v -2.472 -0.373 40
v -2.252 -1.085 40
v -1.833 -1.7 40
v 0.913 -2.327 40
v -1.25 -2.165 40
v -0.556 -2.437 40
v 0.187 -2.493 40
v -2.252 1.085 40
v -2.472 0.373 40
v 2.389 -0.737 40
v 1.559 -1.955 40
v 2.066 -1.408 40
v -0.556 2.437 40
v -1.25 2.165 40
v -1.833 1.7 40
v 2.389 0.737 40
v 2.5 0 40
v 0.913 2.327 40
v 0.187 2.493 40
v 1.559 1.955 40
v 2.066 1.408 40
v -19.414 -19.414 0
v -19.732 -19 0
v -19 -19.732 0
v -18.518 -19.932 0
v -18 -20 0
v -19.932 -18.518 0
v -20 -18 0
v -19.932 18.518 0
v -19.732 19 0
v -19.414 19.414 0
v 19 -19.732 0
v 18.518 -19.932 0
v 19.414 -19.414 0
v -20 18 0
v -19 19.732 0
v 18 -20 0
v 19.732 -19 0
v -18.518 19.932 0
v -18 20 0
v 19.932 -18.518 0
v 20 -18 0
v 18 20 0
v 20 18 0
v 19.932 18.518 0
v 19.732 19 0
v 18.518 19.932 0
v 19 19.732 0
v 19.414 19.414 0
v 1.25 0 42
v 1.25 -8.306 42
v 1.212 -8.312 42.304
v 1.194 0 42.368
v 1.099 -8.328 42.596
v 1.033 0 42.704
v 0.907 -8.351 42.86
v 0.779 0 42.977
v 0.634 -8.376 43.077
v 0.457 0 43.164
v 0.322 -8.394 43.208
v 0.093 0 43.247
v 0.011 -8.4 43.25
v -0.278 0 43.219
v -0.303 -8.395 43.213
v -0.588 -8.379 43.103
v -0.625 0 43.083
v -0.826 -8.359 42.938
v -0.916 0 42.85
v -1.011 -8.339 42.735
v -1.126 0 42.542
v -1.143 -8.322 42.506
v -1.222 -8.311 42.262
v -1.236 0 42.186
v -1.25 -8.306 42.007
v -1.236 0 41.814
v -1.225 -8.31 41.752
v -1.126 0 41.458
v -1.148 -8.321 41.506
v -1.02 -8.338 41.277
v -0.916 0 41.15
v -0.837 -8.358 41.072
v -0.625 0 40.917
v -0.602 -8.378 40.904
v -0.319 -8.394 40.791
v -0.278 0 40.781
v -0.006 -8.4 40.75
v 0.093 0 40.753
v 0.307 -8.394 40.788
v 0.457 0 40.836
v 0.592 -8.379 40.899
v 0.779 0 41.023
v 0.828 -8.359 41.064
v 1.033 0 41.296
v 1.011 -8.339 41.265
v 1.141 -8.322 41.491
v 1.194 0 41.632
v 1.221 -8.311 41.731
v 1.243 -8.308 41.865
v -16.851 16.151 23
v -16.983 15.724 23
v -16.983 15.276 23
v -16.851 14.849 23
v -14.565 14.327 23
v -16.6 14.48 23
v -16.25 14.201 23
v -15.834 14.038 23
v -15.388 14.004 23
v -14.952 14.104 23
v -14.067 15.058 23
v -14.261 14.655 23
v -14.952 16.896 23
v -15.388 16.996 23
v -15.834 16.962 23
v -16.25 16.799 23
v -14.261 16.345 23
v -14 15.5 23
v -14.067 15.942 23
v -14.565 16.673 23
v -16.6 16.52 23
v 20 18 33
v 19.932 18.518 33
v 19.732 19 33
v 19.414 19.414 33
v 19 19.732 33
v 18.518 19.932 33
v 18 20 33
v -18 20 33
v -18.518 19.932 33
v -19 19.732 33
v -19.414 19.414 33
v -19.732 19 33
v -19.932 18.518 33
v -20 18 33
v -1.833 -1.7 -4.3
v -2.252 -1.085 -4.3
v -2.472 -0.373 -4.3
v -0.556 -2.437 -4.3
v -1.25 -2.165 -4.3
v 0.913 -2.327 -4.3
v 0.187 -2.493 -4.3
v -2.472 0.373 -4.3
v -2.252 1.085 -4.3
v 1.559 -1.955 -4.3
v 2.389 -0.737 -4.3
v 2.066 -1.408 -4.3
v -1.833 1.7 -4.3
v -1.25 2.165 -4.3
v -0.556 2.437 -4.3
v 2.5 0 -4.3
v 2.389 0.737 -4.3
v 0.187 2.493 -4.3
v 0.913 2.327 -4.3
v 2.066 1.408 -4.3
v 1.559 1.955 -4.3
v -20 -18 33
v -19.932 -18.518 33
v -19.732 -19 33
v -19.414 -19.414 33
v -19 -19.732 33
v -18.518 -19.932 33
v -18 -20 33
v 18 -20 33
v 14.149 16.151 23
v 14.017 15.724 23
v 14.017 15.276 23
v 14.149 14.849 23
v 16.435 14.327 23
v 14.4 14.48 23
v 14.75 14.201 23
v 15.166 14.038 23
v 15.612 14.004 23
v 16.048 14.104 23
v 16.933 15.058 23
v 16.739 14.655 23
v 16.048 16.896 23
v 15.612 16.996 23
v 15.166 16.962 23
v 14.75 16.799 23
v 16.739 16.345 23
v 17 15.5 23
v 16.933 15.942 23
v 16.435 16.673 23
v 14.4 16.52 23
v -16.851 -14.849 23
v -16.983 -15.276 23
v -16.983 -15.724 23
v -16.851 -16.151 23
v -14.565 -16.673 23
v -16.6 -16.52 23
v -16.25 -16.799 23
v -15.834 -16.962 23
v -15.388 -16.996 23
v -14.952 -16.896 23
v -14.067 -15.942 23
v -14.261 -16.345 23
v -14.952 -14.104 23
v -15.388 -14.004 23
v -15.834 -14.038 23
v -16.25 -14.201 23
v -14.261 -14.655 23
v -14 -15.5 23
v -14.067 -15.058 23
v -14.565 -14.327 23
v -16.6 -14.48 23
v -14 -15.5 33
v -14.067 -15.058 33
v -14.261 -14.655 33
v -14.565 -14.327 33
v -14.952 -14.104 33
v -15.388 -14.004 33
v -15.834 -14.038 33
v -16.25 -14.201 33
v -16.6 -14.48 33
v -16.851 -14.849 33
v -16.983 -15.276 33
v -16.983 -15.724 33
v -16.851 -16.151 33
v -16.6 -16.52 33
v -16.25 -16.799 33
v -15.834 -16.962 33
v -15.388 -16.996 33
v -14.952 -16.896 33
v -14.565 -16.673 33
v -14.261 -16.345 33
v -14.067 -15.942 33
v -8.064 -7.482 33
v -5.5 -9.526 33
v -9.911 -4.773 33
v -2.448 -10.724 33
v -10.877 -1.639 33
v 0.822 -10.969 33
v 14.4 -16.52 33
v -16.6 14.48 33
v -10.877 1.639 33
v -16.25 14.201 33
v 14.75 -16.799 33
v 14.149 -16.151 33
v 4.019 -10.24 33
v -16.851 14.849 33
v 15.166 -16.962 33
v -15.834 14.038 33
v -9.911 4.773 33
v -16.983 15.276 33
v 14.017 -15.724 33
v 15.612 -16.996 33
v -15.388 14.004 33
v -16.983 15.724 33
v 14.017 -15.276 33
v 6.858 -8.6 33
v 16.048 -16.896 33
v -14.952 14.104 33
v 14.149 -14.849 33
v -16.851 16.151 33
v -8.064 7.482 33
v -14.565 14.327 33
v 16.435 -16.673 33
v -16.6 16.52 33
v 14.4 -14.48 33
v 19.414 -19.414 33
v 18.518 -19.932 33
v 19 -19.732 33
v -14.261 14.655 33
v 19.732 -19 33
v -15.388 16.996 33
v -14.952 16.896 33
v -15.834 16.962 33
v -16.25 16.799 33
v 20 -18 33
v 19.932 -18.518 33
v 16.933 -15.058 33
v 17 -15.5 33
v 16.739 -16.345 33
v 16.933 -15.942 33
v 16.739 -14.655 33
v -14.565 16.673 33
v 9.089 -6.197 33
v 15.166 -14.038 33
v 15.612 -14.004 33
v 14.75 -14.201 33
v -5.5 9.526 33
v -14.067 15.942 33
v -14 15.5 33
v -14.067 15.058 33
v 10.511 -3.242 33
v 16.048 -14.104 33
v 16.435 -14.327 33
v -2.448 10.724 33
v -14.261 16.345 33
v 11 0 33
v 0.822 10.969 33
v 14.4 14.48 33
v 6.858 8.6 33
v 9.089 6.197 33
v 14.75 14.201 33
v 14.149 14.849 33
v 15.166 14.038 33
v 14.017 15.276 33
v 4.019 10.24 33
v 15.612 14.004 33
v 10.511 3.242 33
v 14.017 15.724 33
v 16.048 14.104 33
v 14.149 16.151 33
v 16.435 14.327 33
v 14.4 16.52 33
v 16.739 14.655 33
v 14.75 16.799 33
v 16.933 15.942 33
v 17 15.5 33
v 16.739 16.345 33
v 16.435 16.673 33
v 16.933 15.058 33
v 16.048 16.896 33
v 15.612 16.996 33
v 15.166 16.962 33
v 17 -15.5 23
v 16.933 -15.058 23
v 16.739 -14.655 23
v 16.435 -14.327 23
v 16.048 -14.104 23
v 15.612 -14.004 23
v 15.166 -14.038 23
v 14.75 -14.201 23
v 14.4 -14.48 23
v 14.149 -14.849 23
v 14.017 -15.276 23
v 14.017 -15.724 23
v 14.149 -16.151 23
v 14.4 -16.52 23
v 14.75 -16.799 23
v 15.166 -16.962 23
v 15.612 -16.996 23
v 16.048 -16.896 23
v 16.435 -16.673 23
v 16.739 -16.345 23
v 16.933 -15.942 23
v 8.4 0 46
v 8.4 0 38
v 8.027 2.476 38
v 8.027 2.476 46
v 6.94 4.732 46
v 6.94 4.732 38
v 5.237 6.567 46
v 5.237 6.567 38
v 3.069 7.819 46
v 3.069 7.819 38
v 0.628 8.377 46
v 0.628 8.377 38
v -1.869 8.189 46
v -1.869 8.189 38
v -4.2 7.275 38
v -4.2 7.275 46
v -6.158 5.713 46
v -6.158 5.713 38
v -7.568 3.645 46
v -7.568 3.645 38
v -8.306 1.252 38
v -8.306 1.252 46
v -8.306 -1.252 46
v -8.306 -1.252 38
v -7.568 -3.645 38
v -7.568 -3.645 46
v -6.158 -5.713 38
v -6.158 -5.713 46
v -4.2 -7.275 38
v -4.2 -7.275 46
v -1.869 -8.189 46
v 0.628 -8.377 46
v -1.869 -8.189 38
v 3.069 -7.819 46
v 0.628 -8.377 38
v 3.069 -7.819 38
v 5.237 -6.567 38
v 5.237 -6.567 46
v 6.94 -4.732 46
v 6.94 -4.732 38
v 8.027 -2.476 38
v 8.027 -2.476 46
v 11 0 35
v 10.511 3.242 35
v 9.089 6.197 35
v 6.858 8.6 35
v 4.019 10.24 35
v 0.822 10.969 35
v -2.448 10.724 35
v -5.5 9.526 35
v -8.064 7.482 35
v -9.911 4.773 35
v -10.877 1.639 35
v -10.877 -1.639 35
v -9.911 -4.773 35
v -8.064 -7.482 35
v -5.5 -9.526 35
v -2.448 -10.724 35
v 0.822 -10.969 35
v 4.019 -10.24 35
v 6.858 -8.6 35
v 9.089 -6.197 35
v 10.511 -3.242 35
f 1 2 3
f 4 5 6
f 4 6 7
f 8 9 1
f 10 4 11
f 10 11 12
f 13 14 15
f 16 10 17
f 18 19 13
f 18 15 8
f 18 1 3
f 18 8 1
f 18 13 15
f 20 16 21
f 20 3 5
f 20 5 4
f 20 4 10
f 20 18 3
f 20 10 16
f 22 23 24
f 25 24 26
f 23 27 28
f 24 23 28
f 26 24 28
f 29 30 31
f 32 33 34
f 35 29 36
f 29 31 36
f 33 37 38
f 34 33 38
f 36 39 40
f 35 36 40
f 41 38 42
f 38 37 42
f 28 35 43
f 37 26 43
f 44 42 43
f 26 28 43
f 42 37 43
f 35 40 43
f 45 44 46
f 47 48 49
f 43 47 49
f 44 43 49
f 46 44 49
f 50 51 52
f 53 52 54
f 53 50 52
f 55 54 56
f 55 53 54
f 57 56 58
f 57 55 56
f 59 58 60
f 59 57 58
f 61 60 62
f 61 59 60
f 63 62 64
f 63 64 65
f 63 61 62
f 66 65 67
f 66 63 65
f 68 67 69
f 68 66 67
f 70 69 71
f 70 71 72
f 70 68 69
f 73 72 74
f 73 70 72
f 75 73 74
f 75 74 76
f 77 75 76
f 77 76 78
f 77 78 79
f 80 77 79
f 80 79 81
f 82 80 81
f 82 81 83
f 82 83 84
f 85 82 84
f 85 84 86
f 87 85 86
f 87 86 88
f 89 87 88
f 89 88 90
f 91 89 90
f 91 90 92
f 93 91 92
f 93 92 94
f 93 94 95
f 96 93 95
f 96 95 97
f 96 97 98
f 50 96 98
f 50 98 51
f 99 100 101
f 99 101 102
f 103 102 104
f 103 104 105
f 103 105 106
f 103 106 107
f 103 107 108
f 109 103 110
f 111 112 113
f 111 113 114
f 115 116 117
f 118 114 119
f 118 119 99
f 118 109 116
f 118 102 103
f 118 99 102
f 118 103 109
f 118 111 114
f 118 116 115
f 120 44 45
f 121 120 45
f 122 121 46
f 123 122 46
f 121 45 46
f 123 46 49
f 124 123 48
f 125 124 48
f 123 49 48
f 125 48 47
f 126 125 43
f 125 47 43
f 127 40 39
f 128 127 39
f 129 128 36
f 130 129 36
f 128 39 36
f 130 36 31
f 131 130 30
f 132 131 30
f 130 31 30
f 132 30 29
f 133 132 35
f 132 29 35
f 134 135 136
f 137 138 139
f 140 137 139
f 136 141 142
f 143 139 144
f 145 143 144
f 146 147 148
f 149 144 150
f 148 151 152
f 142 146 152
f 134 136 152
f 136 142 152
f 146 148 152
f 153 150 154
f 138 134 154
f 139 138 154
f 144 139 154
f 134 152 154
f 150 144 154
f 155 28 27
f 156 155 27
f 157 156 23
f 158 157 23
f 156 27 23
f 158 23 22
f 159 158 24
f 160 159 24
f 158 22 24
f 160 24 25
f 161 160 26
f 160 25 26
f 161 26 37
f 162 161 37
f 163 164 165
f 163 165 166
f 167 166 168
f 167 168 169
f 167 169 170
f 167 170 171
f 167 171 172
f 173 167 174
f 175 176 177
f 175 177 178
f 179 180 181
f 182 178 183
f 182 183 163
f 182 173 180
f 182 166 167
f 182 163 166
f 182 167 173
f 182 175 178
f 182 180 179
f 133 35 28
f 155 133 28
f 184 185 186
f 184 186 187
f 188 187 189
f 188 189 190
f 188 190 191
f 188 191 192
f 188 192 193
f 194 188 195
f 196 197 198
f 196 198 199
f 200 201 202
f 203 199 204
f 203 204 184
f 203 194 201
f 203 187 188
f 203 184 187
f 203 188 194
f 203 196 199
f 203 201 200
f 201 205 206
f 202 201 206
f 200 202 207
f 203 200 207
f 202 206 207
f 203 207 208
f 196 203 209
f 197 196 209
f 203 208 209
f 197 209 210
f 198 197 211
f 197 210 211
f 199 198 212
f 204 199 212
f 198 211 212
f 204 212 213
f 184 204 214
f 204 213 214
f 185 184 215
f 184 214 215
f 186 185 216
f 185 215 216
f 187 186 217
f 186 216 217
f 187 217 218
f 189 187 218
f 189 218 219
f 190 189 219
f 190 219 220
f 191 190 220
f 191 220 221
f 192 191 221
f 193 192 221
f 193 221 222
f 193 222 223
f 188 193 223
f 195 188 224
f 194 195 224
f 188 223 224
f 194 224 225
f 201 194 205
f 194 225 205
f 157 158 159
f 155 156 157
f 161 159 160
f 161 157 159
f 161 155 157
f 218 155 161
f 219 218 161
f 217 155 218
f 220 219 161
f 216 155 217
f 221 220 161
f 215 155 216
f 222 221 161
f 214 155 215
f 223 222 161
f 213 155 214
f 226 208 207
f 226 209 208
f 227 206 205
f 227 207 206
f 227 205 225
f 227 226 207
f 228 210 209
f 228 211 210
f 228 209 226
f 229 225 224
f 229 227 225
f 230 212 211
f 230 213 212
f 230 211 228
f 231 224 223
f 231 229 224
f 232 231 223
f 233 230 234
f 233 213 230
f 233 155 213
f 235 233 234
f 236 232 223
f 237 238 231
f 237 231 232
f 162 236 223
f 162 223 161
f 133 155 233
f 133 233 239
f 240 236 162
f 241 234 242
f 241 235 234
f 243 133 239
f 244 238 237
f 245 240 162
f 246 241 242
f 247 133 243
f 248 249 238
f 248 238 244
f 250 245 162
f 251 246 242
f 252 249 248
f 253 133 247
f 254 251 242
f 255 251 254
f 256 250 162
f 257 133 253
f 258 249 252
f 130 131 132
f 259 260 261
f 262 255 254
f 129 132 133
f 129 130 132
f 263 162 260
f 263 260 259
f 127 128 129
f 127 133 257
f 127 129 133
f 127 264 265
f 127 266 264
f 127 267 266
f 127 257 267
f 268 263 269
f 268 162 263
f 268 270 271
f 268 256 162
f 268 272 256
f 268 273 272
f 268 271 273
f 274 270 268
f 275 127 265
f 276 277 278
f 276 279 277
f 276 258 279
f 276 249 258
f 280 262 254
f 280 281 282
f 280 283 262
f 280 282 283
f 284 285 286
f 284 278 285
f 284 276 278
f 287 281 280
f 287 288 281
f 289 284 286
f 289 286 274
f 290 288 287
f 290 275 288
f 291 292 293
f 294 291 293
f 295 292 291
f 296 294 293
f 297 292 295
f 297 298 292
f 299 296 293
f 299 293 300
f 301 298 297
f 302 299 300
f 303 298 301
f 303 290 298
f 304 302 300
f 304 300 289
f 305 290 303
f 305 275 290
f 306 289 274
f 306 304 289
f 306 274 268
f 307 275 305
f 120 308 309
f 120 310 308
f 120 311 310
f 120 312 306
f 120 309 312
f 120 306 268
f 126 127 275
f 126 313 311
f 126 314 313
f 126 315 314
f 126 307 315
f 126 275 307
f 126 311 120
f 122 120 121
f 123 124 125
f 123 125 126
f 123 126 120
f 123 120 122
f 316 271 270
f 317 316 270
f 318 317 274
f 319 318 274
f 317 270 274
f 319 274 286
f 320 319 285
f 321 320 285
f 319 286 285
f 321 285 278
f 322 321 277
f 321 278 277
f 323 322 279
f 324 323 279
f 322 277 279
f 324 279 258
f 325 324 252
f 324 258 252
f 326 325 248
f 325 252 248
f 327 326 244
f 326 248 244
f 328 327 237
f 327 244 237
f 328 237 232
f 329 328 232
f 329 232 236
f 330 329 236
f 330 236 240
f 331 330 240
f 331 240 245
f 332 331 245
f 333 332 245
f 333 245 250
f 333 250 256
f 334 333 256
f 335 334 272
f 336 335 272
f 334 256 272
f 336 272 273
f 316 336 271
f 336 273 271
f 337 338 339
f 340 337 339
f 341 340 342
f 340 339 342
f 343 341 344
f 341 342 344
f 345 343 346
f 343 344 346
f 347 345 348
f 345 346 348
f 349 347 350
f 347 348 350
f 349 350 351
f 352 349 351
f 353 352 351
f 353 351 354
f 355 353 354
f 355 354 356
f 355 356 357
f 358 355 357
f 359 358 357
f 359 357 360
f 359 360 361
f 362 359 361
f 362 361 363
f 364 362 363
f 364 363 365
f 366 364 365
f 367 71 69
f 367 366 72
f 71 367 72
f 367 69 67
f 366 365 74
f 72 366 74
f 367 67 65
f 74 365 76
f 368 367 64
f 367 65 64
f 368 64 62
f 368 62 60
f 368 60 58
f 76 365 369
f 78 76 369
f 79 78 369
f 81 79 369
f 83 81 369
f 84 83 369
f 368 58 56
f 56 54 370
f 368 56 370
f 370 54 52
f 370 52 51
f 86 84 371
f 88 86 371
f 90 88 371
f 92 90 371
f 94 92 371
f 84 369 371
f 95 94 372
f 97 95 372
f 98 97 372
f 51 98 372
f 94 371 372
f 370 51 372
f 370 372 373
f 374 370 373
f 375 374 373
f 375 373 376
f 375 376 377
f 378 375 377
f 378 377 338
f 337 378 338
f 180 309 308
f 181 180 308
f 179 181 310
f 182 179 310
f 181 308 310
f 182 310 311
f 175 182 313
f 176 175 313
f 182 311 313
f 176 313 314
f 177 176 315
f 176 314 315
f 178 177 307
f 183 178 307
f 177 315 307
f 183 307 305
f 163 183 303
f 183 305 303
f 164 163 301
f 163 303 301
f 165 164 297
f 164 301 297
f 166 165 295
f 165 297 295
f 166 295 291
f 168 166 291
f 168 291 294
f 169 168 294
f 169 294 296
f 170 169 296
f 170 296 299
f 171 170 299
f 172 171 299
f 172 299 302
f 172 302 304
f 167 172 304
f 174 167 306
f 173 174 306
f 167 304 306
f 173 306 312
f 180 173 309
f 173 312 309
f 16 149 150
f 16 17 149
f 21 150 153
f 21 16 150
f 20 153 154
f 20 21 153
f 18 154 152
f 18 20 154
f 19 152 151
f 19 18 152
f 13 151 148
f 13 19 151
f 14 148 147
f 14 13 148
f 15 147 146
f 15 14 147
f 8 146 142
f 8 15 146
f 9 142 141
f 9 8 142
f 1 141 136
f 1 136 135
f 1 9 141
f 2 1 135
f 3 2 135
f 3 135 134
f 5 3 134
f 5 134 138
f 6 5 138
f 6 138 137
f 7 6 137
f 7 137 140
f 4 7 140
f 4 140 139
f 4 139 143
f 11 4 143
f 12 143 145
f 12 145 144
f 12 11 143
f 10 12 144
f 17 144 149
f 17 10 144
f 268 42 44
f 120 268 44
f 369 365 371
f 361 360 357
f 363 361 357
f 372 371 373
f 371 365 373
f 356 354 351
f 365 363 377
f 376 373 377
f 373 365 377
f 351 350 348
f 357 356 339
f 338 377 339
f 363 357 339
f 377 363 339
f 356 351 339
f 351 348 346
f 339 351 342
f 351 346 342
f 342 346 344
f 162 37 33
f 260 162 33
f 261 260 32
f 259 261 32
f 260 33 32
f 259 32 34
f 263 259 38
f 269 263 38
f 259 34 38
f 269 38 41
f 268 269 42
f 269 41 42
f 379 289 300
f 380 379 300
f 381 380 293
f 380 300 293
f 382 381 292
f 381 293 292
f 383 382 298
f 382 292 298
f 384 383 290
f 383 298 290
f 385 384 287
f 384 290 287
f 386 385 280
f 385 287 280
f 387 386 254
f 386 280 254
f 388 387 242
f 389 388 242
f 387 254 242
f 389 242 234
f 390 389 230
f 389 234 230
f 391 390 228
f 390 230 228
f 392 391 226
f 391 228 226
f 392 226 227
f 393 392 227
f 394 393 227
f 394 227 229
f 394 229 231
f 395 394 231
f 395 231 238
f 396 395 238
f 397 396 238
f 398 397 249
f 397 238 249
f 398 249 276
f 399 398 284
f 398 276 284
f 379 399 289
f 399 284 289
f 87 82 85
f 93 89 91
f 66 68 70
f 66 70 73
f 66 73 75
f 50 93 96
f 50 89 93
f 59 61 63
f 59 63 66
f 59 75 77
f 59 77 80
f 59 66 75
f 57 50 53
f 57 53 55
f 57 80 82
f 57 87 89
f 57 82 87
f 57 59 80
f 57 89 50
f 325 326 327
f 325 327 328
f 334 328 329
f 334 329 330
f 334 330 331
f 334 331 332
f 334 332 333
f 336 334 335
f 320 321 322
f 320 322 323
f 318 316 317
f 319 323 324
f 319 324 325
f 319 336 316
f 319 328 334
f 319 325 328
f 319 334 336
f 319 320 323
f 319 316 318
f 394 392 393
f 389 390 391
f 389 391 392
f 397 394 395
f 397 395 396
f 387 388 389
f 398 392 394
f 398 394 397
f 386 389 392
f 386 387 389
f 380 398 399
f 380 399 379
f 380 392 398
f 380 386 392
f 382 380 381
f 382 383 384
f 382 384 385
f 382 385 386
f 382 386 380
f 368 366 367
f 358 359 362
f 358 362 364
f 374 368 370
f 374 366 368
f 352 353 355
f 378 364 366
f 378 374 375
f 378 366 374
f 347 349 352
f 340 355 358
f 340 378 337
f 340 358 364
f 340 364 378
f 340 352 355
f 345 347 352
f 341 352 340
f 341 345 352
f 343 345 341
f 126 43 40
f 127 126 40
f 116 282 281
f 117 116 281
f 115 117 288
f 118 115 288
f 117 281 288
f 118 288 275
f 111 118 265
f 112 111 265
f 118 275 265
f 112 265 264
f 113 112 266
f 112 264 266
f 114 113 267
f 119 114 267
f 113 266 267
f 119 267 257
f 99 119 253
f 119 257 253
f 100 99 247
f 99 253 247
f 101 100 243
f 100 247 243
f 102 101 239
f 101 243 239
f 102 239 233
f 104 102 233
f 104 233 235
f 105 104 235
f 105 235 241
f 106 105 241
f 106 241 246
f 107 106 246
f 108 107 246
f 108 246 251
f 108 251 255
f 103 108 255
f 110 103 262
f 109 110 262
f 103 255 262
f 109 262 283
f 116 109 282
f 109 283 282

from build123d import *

# Parameters (mm, degrees)
F1_DEPTH      = 33
F2_R          = 11
F3_DEPTH      = 2
F5_START      = 5
F4_R          = 8.4
F5_DEPTH      = 8
F6_R          = 2.5
F7_DEPTH      = 40
F7_DEPTH_BACK = 4.3
F8_R          = 1.5
F9_DEPTH      = 10
F10_R         = 1.25
F11_DEPTH     = 25


with BuildPart() as f1:
    # F0 (on Top) → F1 (new body)
    with BuildSketch(Plane.XY):
        with BuildLine():
            ThreePointArc((20, 18), (19.4142135624, 19.4142135624), (18, 20))
            Line((18, 20), (-18, 20))
            ThreePointArc((-18, 20), (-19.4142135624, 19.4142135624), (-20, 18))
            Line((-20, 18), (-20, -18))
            ThreePointArc((-20, -18), (-19.4142135624, -19.4142135624), (-18, -20))
            Line((-18, -20), (18, -20))
            ThreePointArc((18, -20), (19.4142135624, -19.4142135624), (20, -18))
            Line((20, -18), (20, 18))
        make_face()
    extrude(amount=F1_DEPTH)

    # F2 (on face) → F3 (join)
    with BuildSketch(Plane.XY.offset(33)):
        Circle(F2_R)
    extrude(amount=F3_DEPTH)

    # F8 (on face) → F9 (cut)
    with BuildSketch(Plane.XY.offset(33)):
        with Locations((15.5, 15.5)):
            Circle(F8_R)
        with Locations((-15.5, 15.5)):
            Circle(F8_R)
        with Locations((-15.5, -15.5)):
            Circle(F8_R)
        with Locations((15.5, -15.5)):
            Circle(F8_R)
    extrude(amount=-F9_DEPTH, mode=Mode.SUBTRACT)


with BuildPart() as f5:
    # F4 (on face) → F5 (new body)
    with BuildSketch(Plane.XY.offset(33).offset(F5_START)):
        Circle(F4_R)
    extrude(amount=F5_DEPTH)

    # F10 (on Front) → F11 (cut)
    with BuildSketch(Plane.XZ):
        with Locations((0, 42)):
            Circle(F10_R)
    extrude(amount=F11_DEPTH, mode=Mode.SUBTRACT)


with BuildPart() as f7:
    # F6 (on Top) → F7 (new body, two sides)
    with BuildSketch(Plane.XY) as f7_sk:
        Circle(F6_R)
    extrude(amount=F7_DEPTH)
    extrude(f7_sk.sketch, amount=-F7_DEPTH_BACK)


solid = Compound([f1.part, f5.part, f7.part])
